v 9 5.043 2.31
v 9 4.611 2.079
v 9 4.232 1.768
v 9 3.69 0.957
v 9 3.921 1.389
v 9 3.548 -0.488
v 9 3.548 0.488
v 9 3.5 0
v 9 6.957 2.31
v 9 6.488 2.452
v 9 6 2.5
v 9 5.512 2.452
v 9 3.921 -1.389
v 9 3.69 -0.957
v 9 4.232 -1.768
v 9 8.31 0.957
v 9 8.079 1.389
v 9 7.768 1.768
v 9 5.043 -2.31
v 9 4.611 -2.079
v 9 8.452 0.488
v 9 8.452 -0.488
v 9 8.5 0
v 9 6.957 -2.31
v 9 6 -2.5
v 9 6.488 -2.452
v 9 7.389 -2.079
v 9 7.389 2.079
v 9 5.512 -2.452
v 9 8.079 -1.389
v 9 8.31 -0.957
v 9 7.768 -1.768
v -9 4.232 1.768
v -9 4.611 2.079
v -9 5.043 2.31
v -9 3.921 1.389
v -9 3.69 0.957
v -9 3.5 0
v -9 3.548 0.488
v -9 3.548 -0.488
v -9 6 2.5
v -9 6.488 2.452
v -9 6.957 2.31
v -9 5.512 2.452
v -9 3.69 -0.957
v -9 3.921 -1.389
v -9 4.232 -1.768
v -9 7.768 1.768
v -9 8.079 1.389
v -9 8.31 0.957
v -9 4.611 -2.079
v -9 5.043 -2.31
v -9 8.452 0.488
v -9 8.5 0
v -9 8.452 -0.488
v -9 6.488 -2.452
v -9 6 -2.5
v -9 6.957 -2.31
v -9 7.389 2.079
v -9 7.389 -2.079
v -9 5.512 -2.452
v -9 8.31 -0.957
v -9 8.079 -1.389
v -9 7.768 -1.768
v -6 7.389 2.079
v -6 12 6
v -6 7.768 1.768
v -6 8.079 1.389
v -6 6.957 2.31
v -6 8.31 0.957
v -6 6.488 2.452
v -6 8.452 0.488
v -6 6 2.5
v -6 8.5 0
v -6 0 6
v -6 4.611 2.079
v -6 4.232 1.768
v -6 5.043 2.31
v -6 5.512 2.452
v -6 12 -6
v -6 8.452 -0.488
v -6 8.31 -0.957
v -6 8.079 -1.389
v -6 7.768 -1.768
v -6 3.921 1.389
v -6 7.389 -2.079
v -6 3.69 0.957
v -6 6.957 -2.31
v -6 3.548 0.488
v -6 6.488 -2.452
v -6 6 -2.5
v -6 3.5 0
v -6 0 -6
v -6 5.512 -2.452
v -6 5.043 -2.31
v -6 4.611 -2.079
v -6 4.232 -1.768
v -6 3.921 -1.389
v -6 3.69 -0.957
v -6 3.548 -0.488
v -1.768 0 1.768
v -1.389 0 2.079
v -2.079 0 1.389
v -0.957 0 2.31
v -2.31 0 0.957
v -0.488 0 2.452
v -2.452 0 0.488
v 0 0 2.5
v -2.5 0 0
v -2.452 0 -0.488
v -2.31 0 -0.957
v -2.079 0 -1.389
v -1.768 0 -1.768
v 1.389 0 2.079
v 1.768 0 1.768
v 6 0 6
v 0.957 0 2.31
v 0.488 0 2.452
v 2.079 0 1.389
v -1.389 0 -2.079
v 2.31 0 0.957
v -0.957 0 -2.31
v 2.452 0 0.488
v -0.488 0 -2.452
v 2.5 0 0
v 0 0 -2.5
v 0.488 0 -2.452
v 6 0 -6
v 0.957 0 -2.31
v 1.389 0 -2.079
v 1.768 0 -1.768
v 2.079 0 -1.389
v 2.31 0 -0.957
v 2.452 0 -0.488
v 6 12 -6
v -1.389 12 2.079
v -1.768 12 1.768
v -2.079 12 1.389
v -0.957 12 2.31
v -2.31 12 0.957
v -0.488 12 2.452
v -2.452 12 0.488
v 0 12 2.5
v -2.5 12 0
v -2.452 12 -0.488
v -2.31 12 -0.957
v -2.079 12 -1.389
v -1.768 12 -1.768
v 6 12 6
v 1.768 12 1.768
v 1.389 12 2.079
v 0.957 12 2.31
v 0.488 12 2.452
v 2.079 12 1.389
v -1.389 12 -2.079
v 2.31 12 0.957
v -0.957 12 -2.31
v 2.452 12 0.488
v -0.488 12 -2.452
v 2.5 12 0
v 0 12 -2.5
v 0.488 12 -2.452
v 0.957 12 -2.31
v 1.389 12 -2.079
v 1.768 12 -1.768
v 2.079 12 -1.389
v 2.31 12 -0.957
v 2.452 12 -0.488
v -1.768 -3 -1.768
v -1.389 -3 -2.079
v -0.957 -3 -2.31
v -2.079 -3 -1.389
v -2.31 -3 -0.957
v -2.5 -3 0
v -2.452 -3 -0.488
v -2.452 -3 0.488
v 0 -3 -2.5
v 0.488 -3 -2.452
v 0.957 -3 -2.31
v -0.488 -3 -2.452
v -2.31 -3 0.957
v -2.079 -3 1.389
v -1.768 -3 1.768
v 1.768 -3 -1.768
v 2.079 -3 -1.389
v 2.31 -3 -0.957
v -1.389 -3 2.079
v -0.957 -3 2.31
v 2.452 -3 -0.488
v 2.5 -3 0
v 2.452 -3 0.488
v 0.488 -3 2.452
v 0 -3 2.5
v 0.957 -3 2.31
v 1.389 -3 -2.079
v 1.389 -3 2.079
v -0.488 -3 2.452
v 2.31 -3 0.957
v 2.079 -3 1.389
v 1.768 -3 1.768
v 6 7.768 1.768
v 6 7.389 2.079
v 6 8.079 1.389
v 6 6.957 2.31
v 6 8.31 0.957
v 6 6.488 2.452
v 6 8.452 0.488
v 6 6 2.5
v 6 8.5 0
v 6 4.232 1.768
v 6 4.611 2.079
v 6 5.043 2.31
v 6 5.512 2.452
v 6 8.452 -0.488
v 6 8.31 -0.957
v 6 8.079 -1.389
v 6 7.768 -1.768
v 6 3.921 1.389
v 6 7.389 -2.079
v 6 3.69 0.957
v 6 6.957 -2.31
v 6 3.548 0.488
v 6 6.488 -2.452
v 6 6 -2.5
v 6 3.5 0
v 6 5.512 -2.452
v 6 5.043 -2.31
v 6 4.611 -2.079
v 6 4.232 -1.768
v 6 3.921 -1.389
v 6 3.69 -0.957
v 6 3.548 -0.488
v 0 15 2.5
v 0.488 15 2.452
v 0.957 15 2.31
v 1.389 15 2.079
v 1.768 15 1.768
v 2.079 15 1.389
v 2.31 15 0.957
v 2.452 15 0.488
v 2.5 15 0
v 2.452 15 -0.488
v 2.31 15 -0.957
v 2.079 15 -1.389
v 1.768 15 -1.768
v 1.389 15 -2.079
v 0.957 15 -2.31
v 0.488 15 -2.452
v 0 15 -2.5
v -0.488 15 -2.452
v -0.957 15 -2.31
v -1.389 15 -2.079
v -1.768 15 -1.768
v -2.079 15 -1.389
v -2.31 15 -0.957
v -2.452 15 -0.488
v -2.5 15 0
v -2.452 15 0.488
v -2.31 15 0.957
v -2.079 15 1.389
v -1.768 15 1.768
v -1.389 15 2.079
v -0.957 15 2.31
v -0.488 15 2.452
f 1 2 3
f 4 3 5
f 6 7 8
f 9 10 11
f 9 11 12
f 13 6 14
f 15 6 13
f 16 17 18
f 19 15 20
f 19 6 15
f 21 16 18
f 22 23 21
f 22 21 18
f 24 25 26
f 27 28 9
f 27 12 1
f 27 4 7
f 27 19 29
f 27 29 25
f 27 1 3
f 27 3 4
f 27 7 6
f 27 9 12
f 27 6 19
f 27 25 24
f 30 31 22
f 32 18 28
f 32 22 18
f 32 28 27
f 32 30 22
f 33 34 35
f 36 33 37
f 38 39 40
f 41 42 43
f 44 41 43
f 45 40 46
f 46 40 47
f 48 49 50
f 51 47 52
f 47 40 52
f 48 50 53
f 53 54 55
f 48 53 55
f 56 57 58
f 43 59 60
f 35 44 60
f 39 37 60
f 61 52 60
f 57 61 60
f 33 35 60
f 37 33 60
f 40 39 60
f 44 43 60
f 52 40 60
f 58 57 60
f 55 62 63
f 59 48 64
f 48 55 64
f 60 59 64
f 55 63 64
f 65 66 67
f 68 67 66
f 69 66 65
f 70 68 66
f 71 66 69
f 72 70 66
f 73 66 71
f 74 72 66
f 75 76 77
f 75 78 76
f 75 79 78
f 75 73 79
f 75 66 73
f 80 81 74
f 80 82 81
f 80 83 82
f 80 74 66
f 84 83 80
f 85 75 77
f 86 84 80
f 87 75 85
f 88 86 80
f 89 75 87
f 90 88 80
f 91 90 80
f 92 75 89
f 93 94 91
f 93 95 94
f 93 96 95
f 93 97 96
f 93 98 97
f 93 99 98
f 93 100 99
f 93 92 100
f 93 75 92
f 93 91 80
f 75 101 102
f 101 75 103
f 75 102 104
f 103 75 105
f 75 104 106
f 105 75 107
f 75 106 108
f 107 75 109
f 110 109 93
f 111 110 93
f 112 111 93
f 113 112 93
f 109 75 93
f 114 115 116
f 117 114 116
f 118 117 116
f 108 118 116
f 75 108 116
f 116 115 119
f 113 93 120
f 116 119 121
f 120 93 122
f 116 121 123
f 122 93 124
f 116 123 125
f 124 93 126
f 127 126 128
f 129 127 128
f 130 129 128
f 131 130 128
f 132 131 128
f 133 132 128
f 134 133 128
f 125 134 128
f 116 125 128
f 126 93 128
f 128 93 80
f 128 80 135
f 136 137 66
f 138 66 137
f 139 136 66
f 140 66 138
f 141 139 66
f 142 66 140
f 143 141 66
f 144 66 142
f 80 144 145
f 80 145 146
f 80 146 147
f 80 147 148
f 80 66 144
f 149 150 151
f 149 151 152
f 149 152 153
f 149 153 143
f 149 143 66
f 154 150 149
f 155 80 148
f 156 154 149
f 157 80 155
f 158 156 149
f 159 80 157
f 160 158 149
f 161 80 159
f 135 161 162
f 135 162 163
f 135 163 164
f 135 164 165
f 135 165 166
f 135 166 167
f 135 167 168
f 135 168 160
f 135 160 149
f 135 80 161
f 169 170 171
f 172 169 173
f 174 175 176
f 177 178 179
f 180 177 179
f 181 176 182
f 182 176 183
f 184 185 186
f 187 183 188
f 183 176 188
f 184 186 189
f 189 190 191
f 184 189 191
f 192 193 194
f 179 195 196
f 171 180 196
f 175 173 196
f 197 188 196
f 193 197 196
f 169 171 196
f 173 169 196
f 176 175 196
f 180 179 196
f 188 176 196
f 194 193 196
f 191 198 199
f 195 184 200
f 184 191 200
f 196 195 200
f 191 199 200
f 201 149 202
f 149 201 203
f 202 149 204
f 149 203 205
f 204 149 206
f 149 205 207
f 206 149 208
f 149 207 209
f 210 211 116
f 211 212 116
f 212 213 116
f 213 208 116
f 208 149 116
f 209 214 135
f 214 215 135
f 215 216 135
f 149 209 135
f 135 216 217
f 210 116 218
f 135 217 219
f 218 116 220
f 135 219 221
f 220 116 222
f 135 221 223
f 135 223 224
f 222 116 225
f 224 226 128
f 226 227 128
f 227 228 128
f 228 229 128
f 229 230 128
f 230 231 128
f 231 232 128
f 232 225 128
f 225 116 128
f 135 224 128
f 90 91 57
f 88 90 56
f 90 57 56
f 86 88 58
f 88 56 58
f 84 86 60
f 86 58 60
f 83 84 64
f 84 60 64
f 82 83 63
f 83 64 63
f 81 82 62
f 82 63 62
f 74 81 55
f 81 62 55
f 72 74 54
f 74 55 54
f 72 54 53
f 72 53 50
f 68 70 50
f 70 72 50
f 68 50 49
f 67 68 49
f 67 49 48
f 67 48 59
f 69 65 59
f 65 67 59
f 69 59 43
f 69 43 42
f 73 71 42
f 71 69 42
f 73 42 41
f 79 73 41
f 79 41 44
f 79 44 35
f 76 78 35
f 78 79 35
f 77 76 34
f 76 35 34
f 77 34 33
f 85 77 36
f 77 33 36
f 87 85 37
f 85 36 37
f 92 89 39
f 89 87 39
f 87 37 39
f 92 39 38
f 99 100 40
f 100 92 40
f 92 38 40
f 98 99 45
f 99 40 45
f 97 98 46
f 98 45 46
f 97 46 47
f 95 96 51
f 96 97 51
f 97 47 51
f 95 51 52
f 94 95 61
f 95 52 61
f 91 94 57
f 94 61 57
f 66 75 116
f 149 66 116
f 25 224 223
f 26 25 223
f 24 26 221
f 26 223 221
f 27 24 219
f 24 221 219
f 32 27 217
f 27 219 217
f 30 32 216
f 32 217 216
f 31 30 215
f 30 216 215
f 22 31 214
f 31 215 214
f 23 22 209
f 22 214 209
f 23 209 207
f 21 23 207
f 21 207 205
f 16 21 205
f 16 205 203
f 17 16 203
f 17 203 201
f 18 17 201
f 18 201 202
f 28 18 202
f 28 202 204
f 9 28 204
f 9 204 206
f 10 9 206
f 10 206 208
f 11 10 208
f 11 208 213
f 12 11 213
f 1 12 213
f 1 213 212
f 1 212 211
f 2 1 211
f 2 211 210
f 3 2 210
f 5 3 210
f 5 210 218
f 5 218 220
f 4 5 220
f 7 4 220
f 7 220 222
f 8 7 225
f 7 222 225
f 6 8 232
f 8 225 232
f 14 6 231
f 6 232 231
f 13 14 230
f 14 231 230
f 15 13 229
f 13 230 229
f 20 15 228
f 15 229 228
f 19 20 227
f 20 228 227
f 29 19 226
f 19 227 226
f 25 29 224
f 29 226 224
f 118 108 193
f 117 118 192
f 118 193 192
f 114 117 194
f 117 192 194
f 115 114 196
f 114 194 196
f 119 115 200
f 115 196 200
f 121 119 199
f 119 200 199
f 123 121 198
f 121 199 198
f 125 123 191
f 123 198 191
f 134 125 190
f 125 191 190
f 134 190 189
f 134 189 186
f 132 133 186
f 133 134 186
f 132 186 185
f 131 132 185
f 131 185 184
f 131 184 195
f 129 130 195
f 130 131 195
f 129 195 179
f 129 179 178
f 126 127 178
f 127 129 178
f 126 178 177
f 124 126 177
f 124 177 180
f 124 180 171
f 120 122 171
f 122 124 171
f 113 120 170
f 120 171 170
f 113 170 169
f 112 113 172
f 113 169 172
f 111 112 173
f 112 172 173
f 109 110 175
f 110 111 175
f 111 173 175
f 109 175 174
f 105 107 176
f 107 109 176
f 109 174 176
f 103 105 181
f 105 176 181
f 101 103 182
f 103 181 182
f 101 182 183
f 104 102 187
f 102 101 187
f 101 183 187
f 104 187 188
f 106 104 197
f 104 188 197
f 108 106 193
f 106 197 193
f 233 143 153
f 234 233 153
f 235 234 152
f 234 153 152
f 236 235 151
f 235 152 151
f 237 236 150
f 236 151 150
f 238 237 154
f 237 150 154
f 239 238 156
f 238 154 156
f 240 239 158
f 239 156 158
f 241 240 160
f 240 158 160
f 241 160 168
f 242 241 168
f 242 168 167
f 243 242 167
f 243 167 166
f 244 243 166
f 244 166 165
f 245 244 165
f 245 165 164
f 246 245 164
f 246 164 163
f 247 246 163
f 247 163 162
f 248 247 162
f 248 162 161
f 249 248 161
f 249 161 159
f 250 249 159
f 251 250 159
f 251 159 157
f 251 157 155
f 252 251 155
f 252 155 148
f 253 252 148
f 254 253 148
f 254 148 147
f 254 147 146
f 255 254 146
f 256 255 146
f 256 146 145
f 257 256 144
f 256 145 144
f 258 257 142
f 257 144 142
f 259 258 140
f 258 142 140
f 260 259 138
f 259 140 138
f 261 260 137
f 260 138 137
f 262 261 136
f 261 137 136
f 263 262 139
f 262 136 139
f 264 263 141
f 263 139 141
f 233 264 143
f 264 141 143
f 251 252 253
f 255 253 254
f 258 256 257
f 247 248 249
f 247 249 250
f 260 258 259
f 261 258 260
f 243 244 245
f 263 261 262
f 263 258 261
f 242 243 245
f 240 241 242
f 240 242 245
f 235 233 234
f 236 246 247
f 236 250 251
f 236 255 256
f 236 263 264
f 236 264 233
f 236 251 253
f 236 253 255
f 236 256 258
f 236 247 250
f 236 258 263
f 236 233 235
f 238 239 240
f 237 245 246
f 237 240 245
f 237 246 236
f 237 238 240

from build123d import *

# Parameters (mm, degrees)
SKETCH_1_W           = 12
SKETCH_1_H           = 12
EXTRUDE_1_DEPTH      = 12
EXTRUDE_2_DEPTH      = 3
EXTRUDE_2_DEPTH_BACK = 15
SKETCH_2_R           = 2.5
EXTRUDE_3_DEPTH      = 3
EXTRUDE_3_DEPTH_BACK = 15
SKETCH_3_R           = 2.5


with BuildPart() as part:
    # 草图1 → 凸台-拉伸1 (new body)
    with BuildSketch(Plane(origin=(0, 0, 0), x_dir=(1, 0, 0), z_dir=(0, 1, 0))):
        Rectangle(SKETCH_1_W, SKETCH_1_H)
    extrude(amount=EXTRUDE_1_DEPTH)

    # 草图2 → 凸台-拉伸2 (add, two sides: drawn at the far end of the back side and taken through both)
    with BuildSketch(Plane(origin=(0, 12, 0), x_dir=(1, 0, 0), z_dir=(0, 1, 0)).offset(-EXTRUDE_2_DEPTH_BACK)):
        with Locations(Location((0, 0, 0), (0, 0, 270))):
            Circle(SKETCH_2_R)
    extrude(amount=EXTRUDE_2_DEPTH + EXTRUDE_2_DEPTH_BACK)

    # 草图3 → 凸台-拉伸3 (add, two sides: drawn at the far end of the back side and taken through both)
    with BuildSketch(Plane(origin=(6, 0, 0), x_dir=(0, 0, -1), z_dir=(1, 0, 0)).offset(-EXTRUDE_3_DEPTH_BACK)):
        with Locations((0, 6)):
            Circle(SKETCH_3_R)
    extrude(amount=EXTRUDE_3_DEPTH + EXTRUDE_3_DEPTH_BACK)


solid = part.part
